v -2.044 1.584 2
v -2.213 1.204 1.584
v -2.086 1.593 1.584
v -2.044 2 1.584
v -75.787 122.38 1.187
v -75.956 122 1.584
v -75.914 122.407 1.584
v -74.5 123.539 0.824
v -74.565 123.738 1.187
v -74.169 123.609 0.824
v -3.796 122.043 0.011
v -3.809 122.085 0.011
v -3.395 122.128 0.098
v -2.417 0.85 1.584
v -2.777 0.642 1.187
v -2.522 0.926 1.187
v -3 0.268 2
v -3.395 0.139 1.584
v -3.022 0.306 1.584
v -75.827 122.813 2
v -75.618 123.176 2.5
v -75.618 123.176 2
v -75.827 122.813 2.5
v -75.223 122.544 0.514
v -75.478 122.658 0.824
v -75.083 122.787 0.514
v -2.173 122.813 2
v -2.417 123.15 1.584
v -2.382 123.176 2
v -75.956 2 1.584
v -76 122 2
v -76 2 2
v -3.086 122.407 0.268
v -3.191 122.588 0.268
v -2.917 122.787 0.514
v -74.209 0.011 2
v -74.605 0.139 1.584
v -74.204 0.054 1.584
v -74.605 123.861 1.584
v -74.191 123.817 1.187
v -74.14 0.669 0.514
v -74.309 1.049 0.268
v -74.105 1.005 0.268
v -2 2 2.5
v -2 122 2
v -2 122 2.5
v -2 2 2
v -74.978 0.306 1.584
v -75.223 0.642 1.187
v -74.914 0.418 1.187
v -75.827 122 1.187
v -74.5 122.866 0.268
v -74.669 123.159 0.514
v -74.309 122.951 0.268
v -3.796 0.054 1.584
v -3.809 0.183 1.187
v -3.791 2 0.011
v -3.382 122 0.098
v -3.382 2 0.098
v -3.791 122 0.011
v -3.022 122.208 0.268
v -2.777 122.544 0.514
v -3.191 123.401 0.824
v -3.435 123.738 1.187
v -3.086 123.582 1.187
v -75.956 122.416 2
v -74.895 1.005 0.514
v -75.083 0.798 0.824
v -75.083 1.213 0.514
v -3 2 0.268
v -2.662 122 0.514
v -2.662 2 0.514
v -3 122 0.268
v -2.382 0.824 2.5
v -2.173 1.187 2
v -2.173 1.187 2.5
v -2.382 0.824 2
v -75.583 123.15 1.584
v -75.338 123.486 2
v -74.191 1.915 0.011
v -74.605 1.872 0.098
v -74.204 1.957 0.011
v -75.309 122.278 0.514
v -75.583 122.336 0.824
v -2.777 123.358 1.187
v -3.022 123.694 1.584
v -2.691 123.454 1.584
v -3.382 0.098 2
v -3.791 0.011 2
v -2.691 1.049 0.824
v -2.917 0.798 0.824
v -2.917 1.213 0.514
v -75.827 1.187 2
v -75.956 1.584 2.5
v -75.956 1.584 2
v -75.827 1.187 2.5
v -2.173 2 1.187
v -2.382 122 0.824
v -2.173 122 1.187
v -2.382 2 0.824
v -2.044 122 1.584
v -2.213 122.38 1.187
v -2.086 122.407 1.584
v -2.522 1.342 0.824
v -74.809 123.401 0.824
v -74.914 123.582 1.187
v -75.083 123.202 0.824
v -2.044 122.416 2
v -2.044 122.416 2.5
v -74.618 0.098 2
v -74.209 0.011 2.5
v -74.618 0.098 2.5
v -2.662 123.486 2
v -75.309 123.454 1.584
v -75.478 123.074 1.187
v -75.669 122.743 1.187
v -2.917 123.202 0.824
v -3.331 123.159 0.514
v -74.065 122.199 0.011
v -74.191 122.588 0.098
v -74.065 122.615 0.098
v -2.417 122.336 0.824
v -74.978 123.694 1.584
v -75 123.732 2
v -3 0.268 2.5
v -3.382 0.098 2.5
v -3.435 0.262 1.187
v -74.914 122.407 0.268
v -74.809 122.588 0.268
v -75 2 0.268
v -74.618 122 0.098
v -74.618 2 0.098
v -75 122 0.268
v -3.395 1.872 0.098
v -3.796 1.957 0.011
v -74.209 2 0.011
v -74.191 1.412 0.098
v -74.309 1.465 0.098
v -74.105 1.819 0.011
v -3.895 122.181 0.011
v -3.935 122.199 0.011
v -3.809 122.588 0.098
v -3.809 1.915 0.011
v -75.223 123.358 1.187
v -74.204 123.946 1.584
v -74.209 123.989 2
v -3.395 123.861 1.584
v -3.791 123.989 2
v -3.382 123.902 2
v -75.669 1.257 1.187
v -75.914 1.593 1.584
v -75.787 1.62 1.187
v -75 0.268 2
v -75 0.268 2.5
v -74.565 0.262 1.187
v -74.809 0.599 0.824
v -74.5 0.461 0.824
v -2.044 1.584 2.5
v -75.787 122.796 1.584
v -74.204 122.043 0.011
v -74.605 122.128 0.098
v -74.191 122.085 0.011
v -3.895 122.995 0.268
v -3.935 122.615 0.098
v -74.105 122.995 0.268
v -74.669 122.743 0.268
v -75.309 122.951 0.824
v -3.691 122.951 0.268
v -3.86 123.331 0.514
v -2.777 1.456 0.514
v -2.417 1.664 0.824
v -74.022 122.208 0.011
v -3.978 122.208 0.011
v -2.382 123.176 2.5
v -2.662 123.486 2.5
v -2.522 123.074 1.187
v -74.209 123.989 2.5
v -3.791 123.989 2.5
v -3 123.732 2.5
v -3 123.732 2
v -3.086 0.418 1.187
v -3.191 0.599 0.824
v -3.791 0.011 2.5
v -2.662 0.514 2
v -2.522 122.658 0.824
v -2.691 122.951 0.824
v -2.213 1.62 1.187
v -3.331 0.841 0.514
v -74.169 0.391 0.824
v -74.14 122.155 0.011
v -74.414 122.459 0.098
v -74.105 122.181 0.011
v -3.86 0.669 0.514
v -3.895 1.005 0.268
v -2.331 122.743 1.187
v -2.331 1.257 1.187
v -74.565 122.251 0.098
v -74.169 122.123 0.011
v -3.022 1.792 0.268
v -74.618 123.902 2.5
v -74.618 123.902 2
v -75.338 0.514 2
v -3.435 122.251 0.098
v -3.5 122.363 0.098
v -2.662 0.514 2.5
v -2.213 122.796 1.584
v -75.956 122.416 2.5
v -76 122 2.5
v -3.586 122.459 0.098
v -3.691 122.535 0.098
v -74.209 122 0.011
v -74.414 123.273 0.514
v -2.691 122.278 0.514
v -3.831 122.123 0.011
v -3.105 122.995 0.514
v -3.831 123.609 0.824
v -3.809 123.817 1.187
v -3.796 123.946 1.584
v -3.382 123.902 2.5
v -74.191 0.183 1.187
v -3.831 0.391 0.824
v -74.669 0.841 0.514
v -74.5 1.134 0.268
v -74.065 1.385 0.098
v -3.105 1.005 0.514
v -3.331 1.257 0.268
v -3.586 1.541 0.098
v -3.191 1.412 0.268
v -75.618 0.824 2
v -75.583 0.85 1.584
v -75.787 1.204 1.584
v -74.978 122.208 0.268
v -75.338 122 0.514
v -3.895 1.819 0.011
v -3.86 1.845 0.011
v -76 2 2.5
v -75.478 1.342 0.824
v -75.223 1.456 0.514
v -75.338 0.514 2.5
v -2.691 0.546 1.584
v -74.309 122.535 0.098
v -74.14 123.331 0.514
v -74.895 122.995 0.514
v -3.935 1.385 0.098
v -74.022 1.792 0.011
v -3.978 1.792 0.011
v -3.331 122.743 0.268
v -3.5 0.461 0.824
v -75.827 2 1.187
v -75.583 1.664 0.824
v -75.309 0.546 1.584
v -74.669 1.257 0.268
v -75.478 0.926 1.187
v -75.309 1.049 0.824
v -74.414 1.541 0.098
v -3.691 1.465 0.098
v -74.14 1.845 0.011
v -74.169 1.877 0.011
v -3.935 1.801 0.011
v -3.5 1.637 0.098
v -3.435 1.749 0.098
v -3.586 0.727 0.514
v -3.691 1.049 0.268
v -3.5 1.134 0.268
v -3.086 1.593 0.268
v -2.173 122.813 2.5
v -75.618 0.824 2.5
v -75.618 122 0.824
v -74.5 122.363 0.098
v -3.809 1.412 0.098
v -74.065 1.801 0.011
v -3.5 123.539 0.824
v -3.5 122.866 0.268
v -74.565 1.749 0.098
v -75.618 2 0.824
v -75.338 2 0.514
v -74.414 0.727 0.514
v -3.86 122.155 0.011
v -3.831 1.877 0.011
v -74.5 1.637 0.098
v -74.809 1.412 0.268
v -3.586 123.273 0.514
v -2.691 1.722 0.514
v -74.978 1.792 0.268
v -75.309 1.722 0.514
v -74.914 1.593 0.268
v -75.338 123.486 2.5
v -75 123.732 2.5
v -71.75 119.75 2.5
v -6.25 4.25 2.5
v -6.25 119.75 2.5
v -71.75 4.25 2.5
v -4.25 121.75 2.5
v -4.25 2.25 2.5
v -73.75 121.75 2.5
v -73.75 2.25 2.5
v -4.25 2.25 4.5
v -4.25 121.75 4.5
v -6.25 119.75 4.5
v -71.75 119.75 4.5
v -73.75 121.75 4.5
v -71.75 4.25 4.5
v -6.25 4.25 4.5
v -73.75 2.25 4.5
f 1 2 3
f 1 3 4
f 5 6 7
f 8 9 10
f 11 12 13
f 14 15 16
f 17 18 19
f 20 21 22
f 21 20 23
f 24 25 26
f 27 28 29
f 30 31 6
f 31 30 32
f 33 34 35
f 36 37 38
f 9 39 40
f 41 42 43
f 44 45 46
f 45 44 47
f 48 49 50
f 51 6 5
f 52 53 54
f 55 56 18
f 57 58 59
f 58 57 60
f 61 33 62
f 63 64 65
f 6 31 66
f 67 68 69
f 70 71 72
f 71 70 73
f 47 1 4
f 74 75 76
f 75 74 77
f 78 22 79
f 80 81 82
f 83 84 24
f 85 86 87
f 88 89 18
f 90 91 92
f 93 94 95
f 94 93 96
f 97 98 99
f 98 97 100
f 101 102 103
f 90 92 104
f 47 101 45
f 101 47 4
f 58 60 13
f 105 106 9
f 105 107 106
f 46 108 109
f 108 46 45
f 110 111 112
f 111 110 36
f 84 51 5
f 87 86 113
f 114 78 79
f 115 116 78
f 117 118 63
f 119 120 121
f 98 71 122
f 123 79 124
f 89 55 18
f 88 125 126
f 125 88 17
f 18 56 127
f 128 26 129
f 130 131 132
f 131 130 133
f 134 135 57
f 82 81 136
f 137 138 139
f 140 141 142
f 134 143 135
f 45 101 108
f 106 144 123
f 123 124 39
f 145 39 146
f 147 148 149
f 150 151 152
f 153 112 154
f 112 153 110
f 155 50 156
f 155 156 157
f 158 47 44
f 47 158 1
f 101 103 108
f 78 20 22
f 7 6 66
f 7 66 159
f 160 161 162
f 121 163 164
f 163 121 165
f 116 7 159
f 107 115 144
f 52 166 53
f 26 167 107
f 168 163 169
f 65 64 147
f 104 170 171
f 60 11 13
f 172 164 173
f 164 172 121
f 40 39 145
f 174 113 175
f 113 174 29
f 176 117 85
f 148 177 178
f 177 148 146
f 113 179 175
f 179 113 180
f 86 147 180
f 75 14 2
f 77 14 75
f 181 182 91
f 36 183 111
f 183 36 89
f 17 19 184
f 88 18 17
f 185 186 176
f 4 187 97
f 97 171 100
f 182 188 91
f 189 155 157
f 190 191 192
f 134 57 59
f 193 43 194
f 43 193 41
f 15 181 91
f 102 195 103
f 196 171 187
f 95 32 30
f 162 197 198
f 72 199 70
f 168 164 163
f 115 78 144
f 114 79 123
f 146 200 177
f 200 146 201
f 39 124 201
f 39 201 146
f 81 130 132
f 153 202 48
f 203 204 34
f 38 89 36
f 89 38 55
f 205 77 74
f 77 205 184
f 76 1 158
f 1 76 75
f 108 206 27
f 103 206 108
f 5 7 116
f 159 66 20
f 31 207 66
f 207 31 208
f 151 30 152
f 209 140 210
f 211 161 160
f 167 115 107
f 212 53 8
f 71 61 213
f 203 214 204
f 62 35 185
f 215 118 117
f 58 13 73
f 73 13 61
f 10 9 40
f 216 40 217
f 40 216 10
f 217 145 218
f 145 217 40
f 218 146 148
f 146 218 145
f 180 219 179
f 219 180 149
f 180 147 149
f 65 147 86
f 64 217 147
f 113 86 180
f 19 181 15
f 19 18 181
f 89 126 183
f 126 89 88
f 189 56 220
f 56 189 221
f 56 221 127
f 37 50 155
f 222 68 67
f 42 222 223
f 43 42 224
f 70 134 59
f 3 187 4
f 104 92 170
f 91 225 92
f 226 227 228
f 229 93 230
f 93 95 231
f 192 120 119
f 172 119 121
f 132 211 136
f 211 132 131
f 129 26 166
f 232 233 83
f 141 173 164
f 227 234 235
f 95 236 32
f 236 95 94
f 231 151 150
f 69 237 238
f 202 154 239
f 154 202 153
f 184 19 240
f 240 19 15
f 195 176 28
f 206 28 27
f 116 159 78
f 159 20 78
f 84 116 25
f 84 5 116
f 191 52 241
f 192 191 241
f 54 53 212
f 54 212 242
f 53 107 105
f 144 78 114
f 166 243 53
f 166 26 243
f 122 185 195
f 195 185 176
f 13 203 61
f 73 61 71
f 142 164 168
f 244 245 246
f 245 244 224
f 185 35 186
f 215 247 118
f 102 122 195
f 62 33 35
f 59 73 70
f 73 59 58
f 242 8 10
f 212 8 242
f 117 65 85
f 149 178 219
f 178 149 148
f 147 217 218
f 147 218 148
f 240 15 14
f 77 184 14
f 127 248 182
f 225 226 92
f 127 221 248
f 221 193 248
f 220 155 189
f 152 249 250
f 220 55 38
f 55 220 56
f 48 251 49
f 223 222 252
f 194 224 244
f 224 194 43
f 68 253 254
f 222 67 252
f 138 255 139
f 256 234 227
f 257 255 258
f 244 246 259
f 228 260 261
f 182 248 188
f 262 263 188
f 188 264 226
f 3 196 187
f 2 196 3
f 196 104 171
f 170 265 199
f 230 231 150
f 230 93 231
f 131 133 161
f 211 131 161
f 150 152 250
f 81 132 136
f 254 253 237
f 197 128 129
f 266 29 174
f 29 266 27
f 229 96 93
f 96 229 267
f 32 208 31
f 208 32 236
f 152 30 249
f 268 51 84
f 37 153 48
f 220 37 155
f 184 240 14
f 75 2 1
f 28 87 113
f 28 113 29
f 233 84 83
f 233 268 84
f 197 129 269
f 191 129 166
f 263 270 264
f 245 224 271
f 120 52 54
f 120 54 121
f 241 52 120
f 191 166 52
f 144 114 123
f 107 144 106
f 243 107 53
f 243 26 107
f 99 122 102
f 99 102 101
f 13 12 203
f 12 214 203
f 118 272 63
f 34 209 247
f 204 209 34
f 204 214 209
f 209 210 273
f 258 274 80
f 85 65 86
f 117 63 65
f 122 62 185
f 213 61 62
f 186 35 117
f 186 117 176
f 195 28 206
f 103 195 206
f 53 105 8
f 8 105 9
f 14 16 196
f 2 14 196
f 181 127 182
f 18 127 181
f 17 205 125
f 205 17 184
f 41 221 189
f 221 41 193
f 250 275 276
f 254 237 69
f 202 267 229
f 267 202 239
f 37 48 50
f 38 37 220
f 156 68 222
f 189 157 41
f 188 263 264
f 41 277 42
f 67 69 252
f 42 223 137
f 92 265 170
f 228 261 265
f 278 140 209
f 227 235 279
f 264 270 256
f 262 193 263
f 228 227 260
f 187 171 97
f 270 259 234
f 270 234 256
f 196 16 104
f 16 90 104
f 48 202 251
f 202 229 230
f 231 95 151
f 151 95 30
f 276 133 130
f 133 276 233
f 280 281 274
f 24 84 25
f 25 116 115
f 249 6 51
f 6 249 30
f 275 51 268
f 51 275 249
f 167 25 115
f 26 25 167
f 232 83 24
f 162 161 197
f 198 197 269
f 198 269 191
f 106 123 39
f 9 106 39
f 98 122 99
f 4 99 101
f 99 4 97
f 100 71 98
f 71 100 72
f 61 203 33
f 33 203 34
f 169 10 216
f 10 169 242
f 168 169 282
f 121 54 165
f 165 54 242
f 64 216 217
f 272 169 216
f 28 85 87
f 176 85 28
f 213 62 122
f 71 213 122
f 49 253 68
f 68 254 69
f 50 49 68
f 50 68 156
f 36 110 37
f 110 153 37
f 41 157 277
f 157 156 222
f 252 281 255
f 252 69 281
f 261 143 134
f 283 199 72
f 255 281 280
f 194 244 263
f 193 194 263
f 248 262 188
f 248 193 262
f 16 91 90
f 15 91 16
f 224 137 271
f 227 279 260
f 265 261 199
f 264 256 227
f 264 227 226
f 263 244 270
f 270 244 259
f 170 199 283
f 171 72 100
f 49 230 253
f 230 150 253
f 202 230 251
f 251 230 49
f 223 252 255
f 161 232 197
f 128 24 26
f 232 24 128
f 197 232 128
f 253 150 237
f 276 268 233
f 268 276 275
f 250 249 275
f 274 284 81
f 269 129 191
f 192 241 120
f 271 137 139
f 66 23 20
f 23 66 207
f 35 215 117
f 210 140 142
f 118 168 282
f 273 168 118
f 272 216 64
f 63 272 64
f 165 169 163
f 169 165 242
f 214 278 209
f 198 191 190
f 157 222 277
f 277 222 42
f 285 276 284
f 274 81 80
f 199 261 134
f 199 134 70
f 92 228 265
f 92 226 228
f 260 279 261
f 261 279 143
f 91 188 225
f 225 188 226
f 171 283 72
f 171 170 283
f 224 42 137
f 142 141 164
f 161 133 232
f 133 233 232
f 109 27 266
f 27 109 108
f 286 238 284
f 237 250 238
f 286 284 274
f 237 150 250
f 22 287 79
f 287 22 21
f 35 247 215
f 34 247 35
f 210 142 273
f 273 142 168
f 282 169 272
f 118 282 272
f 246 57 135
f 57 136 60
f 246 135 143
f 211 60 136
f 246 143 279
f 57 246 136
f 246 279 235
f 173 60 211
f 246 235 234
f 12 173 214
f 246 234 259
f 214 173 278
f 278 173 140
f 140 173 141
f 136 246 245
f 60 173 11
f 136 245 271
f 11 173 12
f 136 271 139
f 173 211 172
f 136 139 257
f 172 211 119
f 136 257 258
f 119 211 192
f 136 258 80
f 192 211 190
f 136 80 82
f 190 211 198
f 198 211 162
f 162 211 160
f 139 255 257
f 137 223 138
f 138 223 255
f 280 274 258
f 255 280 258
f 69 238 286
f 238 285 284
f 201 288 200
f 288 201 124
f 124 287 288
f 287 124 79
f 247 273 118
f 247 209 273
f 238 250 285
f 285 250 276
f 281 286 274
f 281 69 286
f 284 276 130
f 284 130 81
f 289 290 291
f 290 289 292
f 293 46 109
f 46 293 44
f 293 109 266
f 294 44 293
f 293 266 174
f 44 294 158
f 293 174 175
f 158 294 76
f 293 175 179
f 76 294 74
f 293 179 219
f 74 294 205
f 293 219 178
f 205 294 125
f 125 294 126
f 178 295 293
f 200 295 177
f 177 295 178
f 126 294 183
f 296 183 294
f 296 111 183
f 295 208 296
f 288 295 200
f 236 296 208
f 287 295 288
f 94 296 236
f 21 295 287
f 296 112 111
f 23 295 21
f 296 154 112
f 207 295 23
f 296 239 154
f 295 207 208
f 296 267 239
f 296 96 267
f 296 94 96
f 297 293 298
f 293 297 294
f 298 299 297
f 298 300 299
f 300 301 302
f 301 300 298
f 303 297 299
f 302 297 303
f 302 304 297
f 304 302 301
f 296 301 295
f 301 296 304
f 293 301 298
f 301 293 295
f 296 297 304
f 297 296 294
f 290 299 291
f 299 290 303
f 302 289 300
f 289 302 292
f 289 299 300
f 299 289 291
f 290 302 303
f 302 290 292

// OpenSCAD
//Procedural Project Box v1
//CudaTox, 2017

inside_width = 70;
inside_length = 120;
inside_height = 20;
thickness = 2;                  //Wall thickness
radius = 2;                     //Fillet radius. Should not be larger than thickness
extra_lid_thickness = 0.5;      //Extra lid thickness above thickness. 
                                //You may wan to tweak this to account for large chamfer radius.

outside_width = inside_width + thickness * 2;
outside_length = inside_length + thickness * 2;


module rounded_box(x,y,z,r){
    translate([r,r,r])
    minkowski(){
        cube([x-r*2,y-r*2,z-r*2]);
        sphere(r=r, $fs=0.1);
    }
}

module main_box(){
    difference(){
        //cube([outside_width, outside_length, inside_height + thickness * 2]);
        difference(){
            rounded_box(outside_width, outside_length, inside_height + thickness + 2, radius);
            translate([0,0,inside_height + thickness])
            cube([outside_width, outside_length, inside_height + thickness * 2]);
        }
        translate([thickness, thickness, thickness])
        cube([inside_width, inside_length, inside_height + thickness]);
    }
}

module lid(){
//Lid.
difference(){
    rounded_box(outside_width, outside_length, thickness * 4, radius);
    translate([0,0, thickness + extra_lid_thickness])
        cube([outside_width, outside_length, inside_height + thickness * 4]);
}
//Lip
lip_tol = 0.5;
lip_width = inside_width - lip_tol;
lip_length = inside_length - lip_tol;
translate([(outside_width - lip_width)/2,(outside_length - lip_length)/2, thickness + 0.5])
    difference(){
        cube([lip_width, lip_length, 2]);
        translate([thickness, thickness, 0])
            cube([lip_width-thickness*2, lip_length-thickness*2, 2]);
    }

}

//main_box();
translate([-outside_width-2,0,0])
    lid();
